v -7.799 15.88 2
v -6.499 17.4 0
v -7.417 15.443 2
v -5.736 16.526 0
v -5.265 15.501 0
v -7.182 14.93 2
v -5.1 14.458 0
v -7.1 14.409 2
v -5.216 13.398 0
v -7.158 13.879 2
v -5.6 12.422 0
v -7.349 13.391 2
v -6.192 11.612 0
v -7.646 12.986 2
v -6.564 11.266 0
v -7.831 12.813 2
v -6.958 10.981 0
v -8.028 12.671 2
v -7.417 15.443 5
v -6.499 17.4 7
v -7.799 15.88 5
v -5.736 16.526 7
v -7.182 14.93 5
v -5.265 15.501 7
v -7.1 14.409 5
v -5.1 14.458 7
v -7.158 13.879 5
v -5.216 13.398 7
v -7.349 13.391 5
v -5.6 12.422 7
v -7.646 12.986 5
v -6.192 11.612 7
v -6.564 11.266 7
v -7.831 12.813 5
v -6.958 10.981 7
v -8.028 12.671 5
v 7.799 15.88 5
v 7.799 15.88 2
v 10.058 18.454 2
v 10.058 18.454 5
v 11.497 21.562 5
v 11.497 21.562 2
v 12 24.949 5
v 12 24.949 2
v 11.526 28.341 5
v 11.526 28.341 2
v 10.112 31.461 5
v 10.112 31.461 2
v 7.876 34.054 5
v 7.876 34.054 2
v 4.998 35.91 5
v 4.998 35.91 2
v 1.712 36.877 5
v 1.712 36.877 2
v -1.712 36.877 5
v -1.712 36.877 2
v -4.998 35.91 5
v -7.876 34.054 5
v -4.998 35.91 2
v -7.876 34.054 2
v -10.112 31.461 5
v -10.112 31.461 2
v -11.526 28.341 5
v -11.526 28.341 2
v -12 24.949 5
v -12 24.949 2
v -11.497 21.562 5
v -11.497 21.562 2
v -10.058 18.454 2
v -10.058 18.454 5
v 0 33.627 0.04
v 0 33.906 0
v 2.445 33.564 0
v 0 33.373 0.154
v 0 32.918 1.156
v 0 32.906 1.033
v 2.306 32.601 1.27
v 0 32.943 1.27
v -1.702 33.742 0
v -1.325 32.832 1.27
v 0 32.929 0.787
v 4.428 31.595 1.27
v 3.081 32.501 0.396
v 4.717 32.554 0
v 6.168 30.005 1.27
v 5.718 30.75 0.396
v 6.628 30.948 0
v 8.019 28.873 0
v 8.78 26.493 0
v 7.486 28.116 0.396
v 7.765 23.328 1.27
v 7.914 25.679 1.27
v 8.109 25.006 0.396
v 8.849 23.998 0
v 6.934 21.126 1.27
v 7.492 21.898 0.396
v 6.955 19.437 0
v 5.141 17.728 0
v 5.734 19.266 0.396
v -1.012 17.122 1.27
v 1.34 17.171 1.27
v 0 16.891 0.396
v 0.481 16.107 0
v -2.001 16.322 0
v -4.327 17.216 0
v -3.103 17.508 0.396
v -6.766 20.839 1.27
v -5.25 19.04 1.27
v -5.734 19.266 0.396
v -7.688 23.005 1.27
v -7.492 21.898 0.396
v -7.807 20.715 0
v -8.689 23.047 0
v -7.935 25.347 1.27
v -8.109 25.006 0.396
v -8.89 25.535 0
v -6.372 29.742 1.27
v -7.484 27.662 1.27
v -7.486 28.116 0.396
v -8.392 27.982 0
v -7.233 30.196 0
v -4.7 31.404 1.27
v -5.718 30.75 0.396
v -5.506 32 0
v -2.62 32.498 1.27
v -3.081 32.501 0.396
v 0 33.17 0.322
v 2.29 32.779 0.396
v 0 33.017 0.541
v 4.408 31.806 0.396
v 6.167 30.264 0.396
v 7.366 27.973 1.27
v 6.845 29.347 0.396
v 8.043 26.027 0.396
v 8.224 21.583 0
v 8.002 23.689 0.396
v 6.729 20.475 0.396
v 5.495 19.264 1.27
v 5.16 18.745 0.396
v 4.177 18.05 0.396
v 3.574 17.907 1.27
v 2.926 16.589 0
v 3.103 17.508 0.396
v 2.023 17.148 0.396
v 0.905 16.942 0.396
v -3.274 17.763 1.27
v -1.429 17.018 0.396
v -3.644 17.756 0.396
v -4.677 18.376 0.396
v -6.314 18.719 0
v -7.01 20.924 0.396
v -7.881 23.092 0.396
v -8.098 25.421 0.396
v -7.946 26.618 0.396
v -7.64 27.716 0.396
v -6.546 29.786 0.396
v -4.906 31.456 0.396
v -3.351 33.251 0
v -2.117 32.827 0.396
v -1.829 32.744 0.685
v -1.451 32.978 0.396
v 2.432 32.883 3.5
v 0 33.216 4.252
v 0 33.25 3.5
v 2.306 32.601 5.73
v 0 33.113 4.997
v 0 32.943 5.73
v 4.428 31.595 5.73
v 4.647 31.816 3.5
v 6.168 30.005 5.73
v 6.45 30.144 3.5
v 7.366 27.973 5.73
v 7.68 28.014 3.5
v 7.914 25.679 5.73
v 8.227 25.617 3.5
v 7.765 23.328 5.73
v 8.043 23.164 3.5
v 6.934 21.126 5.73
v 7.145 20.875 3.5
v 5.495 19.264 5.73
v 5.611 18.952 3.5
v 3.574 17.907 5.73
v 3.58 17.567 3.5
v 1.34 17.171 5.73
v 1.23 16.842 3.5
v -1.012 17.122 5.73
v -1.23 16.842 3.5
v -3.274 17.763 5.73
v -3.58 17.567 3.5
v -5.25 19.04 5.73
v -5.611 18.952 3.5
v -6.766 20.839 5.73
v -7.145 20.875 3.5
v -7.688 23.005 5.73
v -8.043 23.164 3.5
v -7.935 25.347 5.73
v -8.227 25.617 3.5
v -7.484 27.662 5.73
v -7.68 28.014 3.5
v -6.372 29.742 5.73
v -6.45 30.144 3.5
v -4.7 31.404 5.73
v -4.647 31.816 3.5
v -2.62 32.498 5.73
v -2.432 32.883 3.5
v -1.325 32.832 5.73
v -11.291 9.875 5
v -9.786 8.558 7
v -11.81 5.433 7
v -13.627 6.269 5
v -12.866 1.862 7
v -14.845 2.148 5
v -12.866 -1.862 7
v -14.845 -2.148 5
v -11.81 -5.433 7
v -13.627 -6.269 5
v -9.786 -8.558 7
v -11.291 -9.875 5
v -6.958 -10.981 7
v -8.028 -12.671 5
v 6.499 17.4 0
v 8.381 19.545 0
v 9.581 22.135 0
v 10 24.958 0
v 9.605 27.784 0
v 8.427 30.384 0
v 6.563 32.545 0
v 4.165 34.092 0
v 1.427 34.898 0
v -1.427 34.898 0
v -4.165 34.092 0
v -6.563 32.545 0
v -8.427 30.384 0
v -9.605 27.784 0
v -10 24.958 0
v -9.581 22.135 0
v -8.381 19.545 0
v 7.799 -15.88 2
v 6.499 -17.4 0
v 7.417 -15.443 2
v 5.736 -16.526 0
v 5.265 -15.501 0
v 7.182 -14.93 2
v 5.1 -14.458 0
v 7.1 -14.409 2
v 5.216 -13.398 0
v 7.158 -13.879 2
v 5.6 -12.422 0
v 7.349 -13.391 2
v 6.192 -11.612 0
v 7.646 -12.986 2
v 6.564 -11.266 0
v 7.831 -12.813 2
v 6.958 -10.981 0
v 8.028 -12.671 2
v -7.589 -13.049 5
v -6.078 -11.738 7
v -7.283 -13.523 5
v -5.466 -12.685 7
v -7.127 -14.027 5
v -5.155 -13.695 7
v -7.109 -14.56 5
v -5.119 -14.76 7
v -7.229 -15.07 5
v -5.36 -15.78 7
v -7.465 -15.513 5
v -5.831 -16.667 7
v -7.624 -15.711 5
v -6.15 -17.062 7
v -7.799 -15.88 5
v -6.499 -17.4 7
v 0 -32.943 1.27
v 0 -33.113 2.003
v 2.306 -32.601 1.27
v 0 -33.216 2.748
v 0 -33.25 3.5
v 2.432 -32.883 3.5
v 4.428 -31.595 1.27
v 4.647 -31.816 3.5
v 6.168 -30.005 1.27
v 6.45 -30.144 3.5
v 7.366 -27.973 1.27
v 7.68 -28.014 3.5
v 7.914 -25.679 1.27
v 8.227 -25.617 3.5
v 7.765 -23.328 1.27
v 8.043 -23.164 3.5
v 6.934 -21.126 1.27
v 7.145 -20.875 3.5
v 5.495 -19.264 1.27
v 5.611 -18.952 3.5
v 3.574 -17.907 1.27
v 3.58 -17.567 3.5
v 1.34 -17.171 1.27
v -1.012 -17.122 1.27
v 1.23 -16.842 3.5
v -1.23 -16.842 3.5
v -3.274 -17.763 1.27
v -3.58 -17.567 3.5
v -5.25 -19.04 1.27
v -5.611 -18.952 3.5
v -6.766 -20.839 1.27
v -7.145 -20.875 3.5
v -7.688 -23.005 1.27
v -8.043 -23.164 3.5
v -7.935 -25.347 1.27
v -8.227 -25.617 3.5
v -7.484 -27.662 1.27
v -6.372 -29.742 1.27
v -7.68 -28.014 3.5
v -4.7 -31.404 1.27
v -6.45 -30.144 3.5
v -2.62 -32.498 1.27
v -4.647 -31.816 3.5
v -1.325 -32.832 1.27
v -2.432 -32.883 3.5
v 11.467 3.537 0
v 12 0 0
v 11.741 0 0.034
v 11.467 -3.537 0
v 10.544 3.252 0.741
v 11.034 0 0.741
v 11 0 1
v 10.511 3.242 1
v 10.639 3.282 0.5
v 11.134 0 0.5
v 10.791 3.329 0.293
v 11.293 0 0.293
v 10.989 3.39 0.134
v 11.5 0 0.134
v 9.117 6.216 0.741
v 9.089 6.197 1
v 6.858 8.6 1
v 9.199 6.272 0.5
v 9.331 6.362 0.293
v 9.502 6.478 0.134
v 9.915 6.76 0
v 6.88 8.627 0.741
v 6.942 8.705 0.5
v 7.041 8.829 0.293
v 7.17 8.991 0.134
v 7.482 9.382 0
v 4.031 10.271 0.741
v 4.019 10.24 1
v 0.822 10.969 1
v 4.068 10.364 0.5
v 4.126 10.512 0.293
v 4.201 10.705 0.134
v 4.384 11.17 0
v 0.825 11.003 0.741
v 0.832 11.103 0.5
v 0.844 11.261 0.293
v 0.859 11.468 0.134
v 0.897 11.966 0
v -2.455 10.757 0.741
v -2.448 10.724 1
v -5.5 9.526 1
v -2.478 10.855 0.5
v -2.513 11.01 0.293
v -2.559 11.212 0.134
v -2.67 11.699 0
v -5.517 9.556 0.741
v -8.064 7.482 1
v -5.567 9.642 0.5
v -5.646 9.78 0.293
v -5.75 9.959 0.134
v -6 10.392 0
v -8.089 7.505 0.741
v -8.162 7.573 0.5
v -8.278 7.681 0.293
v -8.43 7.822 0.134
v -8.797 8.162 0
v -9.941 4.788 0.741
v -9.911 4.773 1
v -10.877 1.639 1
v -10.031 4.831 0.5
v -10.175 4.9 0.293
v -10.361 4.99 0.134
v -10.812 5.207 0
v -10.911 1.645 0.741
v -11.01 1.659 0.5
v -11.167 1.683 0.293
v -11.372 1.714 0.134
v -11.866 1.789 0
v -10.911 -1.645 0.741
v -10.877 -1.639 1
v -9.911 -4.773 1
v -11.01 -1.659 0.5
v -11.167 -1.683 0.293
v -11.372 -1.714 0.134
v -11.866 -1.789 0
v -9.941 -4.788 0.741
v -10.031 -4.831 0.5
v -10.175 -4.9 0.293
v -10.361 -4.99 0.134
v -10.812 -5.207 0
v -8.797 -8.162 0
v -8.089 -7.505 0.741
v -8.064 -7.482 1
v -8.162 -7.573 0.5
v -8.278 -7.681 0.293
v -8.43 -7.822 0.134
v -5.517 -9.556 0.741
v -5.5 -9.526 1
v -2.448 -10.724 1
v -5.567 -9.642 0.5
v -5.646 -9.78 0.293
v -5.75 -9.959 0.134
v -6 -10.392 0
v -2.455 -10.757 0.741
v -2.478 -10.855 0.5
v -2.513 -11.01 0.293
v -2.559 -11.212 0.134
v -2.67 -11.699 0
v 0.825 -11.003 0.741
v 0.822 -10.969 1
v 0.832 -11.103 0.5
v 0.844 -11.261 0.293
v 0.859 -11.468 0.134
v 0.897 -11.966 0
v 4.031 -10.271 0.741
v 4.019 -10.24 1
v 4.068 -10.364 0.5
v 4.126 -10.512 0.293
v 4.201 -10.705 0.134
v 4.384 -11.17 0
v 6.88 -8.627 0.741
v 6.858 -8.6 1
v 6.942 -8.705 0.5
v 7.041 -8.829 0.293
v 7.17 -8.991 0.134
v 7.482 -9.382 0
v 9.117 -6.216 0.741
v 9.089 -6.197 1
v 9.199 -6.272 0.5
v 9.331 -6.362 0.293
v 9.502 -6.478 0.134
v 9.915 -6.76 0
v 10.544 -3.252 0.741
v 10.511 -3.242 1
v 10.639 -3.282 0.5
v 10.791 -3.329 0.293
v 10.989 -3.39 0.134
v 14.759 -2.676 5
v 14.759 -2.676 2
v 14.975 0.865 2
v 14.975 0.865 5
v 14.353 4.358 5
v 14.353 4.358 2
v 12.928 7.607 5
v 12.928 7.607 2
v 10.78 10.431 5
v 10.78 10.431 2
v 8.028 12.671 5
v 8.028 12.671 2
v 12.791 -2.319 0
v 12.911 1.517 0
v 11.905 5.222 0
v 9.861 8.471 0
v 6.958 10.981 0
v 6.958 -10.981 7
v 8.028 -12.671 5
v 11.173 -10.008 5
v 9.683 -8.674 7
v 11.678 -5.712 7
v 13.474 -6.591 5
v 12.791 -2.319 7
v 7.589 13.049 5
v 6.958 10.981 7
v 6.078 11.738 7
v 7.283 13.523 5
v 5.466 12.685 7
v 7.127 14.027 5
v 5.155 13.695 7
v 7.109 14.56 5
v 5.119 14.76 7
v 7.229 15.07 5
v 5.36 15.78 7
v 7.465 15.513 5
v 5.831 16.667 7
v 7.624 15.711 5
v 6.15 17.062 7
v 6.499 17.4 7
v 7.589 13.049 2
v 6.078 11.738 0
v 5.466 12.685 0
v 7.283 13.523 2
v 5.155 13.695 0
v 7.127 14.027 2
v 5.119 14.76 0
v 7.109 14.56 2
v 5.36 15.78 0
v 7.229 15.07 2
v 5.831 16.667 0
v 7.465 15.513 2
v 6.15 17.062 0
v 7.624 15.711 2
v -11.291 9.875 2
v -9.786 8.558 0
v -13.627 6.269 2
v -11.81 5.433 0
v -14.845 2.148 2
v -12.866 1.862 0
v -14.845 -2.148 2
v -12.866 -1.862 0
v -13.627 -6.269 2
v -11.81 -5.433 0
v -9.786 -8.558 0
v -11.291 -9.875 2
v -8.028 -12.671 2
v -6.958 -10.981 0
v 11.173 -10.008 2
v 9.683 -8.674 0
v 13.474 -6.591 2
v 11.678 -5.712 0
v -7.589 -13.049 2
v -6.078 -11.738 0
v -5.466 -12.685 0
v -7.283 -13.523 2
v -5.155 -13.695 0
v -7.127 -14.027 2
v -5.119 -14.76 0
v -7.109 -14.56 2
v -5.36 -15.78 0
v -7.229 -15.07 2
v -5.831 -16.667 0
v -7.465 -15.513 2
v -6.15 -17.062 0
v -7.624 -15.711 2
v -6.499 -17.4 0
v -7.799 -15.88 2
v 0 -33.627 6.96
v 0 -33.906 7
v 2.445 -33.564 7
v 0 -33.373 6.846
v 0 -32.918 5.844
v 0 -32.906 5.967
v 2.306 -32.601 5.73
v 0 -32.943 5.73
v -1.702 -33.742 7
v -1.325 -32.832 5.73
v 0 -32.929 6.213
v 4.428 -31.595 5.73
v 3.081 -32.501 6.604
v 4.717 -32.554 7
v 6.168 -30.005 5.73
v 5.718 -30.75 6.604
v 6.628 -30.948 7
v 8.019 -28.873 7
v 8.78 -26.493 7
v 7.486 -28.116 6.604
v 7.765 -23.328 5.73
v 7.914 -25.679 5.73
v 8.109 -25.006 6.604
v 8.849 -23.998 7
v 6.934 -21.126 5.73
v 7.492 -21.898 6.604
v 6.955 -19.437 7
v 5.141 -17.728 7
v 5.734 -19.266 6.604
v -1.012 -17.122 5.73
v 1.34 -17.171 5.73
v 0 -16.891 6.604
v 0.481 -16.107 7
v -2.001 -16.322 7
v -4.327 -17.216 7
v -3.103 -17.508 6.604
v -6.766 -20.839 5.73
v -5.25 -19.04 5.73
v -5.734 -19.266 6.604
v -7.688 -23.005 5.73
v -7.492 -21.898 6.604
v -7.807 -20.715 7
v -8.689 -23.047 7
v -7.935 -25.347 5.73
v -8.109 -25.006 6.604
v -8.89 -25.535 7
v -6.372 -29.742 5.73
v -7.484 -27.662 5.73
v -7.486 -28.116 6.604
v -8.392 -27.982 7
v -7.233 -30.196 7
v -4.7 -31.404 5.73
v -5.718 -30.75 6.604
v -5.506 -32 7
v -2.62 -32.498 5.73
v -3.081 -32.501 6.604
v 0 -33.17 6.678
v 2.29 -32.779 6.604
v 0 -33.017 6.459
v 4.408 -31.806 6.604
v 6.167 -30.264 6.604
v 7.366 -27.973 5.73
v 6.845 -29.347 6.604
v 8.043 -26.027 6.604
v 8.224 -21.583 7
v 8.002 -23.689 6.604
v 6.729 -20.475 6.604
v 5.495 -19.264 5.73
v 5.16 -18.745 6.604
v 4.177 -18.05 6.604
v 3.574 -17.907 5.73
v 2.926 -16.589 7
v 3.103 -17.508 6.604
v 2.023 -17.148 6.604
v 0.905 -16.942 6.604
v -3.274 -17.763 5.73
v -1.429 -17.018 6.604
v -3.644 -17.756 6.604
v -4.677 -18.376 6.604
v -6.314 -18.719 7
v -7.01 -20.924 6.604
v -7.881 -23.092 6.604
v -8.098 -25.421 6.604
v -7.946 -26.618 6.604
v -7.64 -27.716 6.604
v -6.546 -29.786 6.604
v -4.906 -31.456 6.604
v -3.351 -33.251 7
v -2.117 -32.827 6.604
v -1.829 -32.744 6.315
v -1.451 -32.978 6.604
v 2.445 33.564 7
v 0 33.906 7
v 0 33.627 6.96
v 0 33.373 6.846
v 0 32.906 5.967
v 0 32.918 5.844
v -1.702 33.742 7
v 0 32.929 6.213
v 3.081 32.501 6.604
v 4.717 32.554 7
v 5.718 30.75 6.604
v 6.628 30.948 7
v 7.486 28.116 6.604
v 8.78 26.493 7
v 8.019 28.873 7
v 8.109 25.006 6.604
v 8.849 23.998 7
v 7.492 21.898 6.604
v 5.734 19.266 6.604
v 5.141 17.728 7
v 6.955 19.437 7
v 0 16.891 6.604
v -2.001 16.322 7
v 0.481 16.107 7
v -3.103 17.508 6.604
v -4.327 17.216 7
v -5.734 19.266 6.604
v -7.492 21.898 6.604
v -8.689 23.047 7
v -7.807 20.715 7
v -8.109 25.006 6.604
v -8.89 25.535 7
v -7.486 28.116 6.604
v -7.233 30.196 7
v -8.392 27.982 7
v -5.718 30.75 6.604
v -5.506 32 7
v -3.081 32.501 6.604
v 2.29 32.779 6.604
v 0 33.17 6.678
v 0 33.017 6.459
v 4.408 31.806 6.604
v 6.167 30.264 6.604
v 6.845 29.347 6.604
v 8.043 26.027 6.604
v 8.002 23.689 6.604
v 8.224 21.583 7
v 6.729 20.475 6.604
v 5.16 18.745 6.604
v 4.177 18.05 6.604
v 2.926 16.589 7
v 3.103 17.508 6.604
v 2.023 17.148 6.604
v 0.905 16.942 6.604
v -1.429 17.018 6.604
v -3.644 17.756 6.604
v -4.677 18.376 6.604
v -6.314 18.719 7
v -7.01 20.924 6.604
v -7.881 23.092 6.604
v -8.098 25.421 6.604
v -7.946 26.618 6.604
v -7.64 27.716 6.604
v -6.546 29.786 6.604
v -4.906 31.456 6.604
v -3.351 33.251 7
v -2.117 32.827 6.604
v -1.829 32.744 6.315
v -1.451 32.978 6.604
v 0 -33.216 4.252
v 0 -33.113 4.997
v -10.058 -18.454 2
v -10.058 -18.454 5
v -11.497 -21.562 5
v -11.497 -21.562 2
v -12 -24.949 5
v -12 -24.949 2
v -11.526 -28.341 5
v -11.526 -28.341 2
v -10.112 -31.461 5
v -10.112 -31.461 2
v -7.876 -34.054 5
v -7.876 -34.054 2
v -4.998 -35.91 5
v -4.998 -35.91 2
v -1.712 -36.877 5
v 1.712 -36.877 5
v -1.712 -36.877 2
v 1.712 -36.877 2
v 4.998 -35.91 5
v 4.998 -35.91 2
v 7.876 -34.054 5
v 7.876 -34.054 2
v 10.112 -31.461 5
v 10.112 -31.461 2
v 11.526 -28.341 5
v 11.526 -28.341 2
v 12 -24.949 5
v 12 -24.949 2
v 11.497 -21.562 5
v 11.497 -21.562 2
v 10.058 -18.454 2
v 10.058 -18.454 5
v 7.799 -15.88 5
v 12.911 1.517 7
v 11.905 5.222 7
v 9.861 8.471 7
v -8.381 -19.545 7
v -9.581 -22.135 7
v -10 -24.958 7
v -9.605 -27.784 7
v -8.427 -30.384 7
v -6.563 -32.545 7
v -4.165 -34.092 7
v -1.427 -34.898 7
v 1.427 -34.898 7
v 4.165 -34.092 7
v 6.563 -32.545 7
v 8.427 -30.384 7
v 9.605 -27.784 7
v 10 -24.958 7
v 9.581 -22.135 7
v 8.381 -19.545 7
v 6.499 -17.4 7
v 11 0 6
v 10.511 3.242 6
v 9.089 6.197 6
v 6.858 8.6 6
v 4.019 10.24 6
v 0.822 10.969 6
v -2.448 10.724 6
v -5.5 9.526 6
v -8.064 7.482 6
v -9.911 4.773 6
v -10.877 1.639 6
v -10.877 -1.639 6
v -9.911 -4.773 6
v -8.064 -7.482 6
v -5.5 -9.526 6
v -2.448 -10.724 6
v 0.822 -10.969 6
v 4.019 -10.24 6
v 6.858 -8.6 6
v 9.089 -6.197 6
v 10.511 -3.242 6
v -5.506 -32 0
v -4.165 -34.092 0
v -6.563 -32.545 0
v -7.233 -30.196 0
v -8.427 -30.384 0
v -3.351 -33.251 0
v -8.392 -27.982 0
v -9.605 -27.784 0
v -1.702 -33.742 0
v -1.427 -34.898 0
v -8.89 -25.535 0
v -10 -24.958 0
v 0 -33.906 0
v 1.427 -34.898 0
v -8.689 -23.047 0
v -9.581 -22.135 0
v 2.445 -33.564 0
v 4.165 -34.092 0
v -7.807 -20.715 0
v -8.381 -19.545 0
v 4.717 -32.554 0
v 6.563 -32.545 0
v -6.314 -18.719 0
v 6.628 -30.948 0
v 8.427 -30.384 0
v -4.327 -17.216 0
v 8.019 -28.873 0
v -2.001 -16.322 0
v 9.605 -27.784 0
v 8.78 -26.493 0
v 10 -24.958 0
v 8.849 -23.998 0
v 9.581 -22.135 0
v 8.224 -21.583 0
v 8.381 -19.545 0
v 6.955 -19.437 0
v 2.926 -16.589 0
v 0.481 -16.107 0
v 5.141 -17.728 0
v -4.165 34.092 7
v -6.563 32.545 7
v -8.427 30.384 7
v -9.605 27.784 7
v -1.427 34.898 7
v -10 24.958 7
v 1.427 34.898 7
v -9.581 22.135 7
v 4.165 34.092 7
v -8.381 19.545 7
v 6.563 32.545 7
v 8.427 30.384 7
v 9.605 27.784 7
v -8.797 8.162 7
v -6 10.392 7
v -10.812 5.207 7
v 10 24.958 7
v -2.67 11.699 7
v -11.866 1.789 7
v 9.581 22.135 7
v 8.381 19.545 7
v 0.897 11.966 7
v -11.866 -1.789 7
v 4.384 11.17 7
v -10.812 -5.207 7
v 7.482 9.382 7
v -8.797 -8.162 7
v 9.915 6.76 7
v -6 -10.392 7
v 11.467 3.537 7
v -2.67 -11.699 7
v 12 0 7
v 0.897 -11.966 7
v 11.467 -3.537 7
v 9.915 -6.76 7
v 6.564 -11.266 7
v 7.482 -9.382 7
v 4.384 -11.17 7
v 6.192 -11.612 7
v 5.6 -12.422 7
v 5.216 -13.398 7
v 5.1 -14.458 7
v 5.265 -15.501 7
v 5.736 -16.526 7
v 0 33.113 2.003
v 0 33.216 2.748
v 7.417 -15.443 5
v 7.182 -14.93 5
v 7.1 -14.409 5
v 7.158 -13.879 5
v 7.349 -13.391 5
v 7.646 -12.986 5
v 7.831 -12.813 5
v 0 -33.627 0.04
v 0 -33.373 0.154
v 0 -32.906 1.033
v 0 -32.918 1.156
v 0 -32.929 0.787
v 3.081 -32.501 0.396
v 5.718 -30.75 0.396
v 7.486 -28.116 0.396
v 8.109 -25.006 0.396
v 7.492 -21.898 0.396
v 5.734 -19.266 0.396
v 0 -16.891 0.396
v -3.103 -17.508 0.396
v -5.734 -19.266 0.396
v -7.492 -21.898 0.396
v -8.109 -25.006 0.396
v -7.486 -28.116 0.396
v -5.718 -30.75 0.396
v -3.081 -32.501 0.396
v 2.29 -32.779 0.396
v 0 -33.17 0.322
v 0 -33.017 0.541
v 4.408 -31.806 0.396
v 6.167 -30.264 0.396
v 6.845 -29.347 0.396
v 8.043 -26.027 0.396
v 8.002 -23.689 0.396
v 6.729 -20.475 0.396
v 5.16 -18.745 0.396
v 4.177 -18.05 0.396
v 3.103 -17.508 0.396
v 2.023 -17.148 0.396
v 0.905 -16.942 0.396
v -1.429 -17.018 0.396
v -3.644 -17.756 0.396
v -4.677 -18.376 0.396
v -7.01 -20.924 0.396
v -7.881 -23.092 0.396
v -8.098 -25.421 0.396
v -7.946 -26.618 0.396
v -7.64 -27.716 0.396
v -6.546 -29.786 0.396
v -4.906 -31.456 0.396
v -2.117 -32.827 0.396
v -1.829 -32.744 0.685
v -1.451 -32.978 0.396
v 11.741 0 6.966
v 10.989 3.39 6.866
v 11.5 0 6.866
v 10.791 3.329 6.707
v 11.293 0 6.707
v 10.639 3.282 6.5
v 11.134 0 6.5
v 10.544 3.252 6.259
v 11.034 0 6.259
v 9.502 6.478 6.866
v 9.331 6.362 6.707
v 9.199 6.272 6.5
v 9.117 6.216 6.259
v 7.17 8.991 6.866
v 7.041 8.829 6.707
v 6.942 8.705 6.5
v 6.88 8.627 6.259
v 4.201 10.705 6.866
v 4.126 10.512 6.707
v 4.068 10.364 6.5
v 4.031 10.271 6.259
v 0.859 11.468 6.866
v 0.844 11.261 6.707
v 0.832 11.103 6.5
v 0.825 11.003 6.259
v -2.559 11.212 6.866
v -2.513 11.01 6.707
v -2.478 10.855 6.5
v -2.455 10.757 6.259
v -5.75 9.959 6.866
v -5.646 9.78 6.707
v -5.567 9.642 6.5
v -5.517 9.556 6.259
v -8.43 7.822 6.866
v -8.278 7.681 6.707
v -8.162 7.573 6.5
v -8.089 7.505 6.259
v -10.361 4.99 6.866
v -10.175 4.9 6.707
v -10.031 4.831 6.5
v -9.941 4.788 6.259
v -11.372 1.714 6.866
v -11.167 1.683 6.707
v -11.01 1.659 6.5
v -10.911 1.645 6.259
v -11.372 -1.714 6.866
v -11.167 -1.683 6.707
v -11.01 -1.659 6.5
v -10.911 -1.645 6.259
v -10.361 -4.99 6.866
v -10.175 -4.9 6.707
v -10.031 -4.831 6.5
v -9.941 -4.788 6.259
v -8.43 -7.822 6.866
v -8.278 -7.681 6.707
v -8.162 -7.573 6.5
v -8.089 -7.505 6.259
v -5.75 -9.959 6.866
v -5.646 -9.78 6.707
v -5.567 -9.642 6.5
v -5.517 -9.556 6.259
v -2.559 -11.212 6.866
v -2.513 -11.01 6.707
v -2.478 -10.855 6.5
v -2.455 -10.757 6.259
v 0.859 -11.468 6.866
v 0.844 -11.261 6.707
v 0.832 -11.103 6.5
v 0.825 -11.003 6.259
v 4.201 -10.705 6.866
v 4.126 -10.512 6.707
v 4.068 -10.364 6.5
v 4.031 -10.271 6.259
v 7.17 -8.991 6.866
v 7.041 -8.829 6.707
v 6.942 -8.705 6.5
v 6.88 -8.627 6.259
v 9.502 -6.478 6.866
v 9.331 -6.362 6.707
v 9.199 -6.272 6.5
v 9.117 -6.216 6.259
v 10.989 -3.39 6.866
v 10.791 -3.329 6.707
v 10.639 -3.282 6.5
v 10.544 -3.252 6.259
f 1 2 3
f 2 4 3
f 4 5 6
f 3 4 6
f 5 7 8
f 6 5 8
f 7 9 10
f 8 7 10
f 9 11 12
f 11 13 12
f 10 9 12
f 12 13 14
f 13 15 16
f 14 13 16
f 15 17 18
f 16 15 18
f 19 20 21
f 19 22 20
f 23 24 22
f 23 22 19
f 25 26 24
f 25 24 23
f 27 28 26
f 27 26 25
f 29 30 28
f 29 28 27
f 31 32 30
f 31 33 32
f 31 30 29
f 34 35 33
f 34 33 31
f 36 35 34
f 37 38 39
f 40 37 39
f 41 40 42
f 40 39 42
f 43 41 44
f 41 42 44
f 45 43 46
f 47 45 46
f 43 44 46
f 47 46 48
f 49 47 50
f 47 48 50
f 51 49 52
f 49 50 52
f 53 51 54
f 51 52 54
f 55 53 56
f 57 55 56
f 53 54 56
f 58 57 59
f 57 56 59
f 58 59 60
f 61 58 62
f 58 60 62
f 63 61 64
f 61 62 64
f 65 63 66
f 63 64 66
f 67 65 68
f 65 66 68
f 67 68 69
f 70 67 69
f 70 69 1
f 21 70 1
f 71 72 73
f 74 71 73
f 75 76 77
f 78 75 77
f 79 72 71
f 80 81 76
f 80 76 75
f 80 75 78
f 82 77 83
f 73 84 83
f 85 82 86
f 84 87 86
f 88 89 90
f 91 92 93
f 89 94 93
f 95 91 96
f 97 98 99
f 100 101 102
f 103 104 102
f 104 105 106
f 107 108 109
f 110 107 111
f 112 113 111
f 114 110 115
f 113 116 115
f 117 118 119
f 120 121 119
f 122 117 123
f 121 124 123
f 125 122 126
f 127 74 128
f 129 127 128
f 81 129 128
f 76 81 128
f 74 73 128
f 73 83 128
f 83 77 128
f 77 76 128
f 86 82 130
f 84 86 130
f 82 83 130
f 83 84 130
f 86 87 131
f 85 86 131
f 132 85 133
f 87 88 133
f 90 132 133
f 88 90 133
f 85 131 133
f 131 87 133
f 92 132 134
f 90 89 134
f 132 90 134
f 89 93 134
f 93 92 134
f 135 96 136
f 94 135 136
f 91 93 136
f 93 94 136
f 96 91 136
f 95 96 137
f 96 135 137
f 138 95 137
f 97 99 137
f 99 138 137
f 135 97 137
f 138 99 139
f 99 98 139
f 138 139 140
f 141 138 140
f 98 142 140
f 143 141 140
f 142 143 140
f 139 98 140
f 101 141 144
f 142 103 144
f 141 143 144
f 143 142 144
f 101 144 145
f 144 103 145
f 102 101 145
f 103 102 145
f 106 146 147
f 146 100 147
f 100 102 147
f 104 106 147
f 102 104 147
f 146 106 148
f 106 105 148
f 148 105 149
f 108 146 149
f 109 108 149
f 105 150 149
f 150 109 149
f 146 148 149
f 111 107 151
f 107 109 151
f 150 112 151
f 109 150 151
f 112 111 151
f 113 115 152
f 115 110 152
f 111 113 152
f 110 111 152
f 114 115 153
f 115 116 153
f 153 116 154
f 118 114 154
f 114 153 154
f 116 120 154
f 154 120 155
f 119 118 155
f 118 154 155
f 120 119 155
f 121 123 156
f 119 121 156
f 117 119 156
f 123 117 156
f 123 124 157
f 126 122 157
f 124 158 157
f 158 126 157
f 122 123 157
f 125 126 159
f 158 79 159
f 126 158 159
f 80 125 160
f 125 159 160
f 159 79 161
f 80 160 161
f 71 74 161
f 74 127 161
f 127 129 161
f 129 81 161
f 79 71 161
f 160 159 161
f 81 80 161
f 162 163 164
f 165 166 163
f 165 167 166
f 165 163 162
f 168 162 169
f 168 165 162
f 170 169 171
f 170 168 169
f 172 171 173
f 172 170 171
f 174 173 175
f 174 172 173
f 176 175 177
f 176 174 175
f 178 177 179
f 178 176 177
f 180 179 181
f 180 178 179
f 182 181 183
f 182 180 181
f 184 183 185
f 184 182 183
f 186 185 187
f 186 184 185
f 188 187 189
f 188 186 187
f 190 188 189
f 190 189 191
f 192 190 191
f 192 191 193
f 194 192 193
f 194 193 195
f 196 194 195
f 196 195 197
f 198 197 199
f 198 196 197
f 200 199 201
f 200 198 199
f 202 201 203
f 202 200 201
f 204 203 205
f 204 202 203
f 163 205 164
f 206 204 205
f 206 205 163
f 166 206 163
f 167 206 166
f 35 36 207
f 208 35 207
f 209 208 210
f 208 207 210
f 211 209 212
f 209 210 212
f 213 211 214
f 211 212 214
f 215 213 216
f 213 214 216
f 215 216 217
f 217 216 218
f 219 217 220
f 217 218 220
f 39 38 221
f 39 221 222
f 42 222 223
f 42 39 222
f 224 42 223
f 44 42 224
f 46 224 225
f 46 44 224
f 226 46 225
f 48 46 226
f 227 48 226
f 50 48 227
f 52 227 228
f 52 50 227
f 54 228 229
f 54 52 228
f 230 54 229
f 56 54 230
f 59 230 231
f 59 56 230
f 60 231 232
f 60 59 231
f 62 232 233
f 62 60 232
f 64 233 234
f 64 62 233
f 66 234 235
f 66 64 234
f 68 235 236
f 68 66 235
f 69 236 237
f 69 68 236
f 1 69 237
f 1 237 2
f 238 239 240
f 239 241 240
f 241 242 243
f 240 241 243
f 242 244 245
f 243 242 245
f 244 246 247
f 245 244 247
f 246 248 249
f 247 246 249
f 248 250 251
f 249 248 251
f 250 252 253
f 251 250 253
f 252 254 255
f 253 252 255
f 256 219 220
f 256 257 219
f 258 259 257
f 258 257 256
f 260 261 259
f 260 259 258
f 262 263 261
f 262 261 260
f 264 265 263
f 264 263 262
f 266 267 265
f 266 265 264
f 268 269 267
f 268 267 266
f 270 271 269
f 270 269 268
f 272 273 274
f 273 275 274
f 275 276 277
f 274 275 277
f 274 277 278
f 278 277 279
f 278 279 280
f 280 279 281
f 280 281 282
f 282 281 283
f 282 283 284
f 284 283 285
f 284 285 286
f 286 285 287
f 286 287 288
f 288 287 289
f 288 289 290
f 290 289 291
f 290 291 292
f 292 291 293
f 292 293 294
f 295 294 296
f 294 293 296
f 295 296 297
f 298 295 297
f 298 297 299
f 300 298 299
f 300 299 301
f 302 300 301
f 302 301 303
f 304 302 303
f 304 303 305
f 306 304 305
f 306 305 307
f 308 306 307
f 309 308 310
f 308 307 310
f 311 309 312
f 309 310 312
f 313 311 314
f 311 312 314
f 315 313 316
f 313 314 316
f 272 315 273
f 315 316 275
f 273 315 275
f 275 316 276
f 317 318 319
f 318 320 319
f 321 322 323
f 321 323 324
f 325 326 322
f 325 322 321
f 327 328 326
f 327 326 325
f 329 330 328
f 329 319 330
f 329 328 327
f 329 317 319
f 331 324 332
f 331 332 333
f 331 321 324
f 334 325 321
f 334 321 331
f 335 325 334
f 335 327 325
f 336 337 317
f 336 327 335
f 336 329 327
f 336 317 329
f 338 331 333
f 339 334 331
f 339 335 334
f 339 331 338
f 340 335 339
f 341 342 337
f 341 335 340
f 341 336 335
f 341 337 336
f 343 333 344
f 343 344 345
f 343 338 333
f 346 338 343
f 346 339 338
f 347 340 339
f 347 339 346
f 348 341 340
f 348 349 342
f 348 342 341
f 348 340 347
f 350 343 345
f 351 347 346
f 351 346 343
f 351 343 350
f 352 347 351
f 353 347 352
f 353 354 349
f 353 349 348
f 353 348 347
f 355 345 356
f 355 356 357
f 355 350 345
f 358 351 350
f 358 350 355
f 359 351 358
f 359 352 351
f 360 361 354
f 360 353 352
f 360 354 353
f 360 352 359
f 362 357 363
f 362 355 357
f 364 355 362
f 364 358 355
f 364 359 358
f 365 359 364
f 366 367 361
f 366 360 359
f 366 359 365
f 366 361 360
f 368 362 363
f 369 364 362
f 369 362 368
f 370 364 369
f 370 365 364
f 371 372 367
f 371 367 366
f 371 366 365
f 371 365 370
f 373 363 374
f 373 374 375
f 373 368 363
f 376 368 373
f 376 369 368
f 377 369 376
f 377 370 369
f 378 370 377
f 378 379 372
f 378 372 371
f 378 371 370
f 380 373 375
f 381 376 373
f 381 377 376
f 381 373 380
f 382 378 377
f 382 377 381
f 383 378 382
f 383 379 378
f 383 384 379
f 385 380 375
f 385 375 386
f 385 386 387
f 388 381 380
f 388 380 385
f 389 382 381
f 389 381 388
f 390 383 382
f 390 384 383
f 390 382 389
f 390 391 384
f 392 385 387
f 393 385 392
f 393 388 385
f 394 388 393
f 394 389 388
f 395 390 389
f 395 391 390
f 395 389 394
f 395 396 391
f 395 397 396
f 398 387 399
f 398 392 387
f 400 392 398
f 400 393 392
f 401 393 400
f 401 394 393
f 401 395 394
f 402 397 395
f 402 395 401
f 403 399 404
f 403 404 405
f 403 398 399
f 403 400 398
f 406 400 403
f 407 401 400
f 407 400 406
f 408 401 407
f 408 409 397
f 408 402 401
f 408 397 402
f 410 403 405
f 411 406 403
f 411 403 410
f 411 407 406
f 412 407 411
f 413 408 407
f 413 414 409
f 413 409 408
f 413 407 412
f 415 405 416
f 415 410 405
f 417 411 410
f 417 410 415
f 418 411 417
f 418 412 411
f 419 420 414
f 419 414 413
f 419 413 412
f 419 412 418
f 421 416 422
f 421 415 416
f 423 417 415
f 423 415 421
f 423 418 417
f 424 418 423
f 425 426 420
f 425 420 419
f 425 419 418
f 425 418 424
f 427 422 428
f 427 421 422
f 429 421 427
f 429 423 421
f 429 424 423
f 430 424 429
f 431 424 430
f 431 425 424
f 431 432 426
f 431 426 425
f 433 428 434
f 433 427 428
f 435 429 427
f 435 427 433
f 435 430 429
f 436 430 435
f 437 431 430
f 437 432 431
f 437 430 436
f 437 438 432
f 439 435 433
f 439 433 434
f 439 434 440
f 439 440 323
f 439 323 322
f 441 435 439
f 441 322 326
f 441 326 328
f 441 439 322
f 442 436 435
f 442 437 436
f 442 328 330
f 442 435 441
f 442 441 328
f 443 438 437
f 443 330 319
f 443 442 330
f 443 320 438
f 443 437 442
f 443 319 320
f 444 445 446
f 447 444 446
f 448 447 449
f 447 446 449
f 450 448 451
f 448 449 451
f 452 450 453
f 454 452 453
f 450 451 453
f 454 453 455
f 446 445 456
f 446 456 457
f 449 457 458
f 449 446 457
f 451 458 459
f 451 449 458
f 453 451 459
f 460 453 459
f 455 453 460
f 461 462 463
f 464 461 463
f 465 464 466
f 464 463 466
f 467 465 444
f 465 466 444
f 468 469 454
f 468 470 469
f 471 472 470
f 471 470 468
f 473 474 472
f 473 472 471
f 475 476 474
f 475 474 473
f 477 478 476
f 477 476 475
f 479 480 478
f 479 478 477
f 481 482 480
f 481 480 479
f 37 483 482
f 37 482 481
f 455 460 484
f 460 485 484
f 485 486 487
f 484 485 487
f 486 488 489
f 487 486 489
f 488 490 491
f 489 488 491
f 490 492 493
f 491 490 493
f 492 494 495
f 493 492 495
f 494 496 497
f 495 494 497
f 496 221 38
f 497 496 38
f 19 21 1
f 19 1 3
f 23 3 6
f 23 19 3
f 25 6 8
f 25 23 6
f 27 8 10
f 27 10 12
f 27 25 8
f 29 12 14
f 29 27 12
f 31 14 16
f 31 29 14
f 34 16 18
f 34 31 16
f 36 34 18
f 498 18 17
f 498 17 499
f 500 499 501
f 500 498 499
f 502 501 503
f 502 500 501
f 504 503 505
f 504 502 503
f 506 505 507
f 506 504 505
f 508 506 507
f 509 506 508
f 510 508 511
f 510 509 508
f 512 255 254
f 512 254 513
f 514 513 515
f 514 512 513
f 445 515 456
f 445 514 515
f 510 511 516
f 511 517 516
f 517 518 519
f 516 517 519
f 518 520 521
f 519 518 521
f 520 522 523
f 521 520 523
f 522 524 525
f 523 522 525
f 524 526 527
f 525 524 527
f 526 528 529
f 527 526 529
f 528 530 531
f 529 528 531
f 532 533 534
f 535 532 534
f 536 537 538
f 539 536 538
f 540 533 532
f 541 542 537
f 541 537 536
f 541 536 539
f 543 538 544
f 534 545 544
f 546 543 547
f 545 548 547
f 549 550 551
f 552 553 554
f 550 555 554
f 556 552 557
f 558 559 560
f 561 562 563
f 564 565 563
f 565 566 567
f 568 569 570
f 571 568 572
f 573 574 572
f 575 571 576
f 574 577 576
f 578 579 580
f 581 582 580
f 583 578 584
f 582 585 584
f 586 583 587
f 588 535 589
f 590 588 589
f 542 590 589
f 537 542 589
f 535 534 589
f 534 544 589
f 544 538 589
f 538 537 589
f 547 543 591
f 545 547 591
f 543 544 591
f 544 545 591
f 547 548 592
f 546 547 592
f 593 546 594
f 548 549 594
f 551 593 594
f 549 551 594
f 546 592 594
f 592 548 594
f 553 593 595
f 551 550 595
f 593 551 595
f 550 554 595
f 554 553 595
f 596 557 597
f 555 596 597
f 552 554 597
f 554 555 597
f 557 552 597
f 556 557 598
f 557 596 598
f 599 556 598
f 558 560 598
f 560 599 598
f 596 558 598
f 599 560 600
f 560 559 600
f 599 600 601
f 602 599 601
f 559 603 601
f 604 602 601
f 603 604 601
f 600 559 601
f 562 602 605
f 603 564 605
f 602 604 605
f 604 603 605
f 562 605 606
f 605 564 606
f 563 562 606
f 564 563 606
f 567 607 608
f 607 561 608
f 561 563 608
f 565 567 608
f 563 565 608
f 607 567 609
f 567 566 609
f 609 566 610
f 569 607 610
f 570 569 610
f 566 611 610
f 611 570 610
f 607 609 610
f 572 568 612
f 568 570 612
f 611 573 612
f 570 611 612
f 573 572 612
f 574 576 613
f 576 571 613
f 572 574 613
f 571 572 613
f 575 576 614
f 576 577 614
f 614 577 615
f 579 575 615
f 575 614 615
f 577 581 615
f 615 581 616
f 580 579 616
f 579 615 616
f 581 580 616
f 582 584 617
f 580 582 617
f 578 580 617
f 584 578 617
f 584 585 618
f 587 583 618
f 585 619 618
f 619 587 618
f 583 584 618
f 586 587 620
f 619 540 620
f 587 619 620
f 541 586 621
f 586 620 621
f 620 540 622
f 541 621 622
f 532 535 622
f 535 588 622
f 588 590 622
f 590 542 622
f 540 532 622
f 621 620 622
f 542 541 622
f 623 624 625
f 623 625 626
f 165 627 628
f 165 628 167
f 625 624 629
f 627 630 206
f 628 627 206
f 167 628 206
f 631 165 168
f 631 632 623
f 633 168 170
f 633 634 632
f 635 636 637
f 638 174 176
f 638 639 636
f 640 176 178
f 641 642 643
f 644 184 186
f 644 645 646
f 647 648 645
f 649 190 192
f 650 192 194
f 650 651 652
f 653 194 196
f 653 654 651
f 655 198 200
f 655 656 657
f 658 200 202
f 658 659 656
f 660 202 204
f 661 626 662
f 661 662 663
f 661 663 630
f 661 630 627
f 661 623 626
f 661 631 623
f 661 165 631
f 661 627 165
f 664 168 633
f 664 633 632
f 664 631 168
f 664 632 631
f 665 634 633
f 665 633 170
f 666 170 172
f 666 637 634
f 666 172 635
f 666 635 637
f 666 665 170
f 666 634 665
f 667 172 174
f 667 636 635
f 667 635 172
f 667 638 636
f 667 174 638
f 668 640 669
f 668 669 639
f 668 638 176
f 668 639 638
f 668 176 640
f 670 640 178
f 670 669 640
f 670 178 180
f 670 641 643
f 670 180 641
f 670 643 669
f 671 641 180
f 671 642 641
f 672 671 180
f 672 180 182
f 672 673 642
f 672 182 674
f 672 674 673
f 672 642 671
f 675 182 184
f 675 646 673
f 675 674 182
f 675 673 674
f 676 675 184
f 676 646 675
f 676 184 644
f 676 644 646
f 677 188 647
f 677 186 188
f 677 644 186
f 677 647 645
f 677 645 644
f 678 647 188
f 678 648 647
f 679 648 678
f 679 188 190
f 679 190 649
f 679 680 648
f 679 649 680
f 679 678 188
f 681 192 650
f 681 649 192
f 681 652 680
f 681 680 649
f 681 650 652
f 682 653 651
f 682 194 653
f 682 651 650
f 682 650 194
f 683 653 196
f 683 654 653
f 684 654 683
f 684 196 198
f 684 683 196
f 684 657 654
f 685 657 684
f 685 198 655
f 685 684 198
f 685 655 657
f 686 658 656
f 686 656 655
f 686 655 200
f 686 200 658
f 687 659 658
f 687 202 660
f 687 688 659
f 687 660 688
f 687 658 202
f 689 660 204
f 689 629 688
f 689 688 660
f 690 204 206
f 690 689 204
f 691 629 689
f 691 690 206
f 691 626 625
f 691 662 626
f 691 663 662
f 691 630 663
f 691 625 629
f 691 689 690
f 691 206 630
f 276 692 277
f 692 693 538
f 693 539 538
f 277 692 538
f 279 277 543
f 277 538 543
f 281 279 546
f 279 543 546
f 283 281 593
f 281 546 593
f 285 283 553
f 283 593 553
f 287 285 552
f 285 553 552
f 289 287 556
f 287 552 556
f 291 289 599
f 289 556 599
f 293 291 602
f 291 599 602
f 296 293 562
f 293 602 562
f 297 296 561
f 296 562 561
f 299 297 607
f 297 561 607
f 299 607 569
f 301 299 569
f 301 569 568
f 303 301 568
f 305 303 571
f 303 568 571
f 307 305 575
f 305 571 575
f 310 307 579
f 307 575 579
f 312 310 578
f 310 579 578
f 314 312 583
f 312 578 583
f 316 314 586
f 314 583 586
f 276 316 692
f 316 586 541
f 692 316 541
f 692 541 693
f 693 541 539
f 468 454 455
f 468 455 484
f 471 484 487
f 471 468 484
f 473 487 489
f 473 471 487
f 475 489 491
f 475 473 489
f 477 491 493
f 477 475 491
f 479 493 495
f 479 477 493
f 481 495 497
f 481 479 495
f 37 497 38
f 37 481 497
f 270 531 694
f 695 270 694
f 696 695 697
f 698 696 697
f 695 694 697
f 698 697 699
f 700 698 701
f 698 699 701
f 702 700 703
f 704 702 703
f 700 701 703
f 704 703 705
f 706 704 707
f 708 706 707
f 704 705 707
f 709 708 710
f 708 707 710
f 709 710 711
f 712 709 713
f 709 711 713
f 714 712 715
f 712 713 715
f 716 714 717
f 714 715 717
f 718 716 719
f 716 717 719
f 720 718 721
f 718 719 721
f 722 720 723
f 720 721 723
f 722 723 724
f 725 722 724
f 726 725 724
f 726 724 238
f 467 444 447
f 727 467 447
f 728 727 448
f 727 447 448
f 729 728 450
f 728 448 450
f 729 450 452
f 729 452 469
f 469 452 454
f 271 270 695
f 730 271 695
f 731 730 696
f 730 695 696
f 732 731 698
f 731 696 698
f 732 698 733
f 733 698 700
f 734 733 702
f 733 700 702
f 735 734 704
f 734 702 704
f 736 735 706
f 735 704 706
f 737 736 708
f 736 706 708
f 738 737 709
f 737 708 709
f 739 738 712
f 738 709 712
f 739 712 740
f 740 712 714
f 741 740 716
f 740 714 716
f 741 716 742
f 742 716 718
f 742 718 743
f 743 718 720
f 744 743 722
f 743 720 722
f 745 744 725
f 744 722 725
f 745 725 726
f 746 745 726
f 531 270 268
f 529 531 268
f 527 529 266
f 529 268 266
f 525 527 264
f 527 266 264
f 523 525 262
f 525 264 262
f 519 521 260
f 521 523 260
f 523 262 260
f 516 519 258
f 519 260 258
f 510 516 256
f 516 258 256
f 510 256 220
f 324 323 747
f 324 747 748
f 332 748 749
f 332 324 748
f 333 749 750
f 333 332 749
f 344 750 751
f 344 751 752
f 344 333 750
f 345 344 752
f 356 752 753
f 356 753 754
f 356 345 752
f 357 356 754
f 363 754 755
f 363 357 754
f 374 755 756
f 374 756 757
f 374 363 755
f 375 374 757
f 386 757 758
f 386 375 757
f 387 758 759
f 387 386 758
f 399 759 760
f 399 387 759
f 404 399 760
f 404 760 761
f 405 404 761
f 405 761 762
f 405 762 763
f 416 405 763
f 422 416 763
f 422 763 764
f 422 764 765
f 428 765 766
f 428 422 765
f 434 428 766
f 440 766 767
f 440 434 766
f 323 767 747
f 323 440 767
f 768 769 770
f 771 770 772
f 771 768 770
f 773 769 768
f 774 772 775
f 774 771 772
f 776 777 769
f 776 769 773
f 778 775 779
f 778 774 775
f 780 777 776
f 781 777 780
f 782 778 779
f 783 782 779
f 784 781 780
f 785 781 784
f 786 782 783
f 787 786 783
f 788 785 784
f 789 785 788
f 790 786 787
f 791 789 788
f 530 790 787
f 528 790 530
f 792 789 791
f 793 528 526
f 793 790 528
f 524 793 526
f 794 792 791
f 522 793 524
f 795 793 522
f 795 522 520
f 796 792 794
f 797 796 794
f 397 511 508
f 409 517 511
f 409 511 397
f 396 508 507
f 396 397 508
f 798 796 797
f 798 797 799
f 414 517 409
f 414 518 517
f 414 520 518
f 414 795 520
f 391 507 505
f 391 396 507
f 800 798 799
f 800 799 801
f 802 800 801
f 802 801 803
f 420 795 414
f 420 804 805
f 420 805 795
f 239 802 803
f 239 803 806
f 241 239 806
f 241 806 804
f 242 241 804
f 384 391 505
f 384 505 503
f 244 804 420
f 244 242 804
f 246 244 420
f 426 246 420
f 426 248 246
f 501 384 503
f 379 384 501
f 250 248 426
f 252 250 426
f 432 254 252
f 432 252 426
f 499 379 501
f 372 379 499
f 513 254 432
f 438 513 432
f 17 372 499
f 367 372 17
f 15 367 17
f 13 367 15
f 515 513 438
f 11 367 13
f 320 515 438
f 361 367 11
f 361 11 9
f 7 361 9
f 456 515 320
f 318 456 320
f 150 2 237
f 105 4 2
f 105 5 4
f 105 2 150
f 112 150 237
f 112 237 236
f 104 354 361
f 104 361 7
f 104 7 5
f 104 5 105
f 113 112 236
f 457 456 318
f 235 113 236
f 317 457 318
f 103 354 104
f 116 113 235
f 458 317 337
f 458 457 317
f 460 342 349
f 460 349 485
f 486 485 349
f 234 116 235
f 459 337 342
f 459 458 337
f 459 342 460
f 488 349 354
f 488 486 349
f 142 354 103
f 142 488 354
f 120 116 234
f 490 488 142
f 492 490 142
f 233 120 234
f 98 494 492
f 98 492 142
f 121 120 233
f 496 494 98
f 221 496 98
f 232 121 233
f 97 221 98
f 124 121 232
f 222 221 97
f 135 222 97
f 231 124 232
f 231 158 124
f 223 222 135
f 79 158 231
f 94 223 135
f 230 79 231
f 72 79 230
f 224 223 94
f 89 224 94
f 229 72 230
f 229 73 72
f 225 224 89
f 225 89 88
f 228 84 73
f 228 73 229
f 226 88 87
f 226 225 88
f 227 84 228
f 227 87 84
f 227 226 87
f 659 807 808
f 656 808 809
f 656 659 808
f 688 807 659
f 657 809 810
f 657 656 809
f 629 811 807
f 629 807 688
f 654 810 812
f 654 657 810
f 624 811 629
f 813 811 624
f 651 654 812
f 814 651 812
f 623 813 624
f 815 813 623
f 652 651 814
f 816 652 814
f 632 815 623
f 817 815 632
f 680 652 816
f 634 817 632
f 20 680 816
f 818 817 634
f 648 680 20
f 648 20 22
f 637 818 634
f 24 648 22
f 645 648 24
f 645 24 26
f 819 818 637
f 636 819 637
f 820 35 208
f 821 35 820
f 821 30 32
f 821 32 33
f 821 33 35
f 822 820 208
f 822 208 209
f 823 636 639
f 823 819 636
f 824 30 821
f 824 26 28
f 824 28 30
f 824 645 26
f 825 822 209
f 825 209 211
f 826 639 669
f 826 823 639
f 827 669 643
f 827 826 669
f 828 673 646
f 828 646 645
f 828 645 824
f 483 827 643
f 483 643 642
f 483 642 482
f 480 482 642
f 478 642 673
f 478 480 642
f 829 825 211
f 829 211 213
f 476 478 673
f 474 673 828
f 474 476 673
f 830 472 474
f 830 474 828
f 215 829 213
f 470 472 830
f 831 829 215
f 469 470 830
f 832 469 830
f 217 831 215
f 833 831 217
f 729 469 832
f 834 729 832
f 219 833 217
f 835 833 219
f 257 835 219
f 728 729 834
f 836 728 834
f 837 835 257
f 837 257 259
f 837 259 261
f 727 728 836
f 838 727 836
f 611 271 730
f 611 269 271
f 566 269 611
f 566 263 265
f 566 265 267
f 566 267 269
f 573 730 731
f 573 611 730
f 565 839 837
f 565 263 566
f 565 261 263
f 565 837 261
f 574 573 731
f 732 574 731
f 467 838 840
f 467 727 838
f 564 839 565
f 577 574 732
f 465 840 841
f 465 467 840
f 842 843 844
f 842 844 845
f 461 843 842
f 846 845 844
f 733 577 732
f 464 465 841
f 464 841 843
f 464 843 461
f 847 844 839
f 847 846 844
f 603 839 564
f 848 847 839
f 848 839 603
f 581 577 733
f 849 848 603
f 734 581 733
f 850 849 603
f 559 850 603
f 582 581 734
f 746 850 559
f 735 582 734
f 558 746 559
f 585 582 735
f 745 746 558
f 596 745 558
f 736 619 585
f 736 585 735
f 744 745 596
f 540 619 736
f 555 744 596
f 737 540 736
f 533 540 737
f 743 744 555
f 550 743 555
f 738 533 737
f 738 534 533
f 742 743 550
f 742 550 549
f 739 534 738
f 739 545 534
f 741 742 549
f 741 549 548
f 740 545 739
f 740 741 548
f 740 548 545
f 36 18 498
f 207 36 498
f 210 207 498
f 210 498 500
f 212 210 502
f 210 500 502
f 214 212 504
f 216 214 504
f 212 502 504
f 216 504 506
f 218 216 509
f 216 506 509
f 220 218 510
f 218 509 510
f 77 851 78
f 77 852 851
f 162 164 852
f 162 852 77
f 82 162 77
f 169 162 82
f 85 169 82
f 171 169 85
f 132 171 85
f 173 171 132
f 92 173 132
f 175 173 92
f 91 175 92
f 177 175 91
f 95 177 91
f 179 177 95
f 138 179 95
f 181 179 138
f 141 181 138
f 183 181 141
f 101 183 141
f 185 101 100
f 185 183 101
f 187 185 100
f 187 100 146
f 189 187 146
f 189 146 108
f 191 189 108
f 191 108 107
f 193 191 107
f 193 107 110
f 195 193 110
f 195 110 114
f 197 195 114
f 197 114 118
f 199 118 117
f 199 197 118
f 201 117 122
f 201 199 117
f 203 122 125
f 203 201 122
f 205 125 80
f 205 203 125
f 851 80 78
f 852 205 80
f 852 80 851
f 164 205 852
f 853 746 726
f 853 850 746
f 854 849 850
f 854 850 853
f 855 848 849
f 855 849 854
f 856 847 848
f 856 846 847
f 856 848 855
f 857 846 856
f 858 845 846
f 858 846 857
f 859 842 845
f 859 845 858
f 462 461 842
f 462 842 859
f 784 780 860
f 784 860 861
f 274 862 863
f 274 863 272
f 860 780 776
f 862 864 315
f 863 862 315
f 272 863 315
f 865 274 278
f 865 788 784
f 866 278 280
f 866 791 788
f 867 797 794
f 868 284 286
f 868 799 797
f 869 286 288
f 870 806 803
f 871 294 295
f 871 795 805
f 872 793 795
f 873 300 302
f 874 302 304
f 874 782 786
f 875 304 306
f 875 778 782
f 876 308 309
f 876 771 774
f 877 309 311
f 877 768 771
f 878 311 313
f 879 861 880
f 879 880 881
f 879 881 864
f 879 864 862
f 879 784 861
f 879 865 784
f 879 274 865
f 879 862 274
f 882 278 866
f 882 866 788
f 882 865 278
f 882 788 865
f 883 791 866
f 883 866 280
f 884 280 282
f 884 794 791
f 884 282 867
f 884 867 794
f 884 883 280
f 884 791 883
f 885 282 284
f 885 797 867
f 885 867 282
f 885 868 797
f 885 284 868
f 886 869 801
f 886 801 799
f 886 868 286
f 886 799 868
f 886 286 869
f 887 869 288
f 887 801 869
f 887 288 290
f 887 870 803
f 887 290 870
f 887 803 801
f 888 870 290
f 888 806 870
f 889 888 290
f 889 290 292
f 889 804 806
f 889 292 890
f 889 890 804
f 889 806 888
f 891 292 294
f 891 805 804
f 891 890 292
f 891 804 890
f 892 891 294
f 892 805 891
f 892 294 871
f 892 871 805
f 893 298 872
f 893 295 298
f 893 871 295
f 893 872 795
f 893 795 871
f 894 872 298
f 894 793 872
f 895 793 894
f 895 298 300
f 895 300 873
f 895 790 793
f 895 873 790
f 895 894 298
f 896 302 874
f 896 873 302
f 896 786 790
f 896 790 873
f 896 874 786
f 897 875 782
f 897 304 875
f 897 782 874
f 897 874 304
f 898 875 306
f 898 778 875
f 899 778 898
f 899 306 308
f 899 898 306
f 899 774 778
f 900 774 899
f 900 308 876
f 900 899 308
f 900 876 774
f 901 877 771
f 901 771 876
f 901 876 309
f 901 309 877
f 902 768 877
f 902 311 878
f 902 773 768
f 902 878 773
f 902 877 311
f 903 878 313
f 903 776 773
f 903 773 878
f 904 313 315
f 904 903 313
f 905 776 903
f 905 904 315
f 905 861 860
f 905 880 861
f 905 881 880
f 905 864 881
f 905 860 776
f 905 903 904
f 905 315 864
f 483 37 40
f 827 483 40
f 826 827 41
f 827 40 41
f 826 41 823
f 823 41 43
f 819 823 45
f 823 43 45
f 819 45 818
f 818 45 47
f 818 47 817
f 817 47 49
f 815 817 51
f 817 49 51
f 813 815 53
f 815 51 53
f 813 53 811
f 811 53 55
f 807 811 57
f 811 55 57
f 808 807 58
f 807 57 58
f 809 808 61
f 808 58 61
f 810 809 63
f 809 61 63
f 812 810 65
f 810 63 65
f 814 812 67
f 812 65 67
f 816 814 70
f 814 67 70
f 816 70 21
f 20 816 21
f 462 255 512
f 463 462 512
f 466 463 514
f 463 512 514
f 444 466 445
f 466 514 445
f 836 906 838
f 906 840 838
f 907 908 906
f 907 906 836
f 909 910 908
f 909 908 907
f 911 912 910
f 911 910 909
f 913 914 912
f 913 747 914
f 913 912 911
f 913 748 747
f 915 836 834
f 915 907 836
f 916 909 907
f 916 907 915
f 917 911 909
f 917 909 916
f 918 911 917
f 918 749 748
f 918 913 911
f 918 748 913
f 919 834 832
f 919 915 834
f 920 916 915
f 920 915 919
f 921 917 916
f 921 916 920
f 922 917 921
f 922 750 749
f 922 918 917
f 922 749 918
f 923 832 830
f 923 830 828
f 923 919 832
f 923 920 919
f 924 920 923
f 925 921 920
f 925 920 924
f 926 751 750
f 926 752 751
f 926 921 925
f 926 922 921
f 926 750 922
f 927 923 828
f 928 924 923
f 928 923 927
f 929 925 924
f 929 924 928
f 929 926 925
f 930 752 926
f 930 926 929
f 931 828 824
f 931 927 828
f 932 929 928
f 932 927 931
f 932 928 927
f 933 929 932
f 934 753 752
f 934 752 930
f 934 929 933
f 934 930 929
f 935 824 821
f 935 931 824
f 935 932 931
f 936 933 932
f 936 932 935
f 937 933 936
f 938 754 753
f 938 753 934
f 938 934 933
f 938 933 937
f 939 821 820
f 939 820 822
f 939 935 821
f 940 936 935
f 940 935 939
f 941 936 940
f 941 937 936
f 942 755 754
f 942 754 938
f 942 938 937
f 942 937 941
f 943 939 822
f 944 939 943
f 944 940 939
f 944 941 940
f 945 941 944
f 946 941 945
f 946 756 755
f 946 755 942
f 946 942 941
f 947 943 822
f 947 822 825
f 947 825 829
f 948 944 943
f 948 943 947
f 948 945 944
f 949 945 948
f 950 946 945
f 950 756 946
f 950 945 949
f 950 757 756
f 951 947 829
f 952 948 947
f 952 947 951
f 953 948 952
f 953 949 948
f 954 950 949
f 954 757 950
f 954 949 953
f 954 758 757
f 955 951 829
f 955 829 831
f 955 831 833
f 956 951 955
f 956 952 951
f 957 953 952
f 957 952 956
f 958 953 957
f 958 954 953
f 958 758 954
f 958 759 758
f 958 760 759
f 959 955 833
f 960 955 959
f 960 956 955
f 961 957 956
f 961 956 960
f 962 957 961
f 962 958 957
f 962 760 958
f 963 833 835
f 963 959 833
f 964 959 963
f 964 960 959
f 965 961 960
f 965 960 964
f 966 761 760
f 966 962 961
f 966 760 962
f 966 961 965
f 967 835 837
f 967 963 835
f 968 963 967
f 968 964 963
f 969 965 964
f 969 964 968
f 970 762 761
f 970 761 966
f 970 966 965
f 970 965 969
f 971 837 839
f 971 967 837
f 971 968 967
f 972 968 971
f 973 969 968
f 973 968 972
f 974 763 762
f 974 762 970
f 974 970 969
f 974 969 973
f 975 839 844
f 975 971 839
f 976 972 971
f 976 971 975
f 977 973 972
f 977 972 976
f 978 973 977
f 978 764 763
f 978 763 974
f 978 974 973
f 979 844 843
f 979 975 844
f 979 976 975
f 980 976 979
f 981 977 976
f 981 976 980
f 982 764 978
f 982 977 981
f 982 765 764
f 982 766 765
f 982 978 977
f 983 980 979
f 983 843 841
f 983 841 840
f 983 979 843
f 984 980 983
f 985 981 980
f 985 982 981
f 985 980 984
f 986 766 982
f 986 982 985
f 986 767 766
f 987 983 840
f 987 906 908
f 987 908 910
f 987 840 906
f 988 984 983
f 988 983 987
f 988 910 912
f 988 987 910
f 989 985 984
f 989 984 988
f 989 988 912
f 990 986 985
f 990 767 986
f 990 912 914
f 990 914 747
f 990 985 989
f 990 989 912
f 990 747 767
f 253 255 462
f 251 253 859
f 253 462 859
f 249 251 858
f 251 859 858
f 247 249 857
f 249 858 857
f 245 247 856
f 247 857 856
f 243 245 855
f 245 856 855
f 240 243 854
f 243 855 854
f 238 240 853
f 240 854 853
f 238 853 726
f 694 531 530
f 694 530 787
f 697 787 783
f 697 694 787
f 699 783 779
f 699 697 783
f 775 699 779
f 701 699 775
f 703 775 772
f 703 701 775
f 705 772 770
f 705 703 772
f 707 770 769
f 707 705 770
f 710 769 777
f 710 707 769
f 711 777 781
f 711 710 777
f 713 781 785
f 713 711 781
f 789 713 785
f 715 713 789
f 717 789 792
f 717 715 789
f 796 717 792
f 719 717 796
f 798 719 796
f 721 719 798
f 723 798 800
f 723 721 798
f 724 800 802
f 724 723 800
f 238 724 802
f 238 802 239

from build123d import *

# Parameters (mm, degrees)
F0_R     = 8.25
F0_R_2   = 11
F1_DEPTH = 7
F2_R     = 2
F3_SIZE  = 2
F9_R     = 1


# Not quite as in the source:
# - a pattern or mirror of a feature is missing from the dataset's text; its kind, count and spacing are read off the source's solid
# - a feature names something its author has since deleted; it is built from what else it names


with BuildPart() as f1:
    # F0 (on Top) → F1 (new body)
    with BuildSketch(Plane.XY):
        with BuildLine():
            ThreePointArc((14.7593654246, -2.6760291972), (12.9903810568, 7.5), (5.0621734463, 14.12))
            ThreePointArc((5.0621734463, 14.12), (0, 37), (-5.0621734463, 14.12))
            ThreePointArc((-5.0621734463, 14.12), (-15, 0), (-5.0621734463, -14.12))
            ThreePointArc((-5.0621734463, -14.12), (0, -37), (5.0621734463, -14.12))
            ThreePointArc((5.0621734463, -14.12), (11.4439708028, -9.6971919783), (14.7593654246, -2.6760291972))
        make_face()
        with Locations((0, -25)):
            Circle(F0_R, mode=Mode.SUBTRACT)
        Circle(F0_R_2, mode=Mode.SUBTRACT)
        with Locations((0, 25)):
            Circle(F0_R, mode=Mode.SUBTRACT)
    extrude(amount=F1_DEPTH)

    # F2
    f2_edges = [f1.edges().sort_by_distance(p)[0] for p in [
        (5.062173, -14.12, 3.5),
        (5.062173, 14.12, 3.5),
        (-5.062173, 14.12, 3.5),
        (-5.062173, -14.12, 3.5),
    ]]
    fillet(f2_edges, radius=F2_R)

    # F3
    f3_edges = [f1.edges().sort_by_distance(p)[0] for p in [
        (0, -37, 7),
        (0, -37, 0),
        (15, 0, 7),
        (15, 0, 0),
        (7.104012, 14.217419, 7),
        (7.104012, -14.217419, 7),
        (0, 37, 7),
        (-7.104012, 14.217419, 7),
        (-7.104012, -14.217419, 7),
        (-15, 0, 7),
        (7.104012, 14.217419, 0),
        (7.104012, -14.217419, 0),
        (0, 37, 0),
        (-7.104012, -14.217419, 0),
        (-7.104012, 14.217419, 0),
        (-15, 0, 0),
    ]]
    chamfer(f3_edges, length=F3_SIZE)

    # F7 (on 3pt) → F8 (revolve)
    with BuildSketch(Plane.YZ):
        with BuildLine():
            Line((-32.4707763987, 7), (-33.25, 7))
            Line((-33.25, 7), (-33.25, 3.5))
            ThreePointArc((-33.25, 3.5), (-33.0528381733, 5.2928461605), (-32.4707763987, 7))
        make_face()
        with BuildLine():
            ThreePointArc((-32.4707763987, 0), (-33.0528381733, 1.7071538395), (-33.25, 3.5))
            Line((-33.25, 3.5), (-33.25, 0))
            Line((-33.25, 0), (-32.4707763987, 0))
        make_face()
    f8 = revolve(axis=Axis((0, -25, 3.5), (0, 0, 1)))

    # F8_copies: F8 across plane
    add(f8.mirror(Plane.ZX))

    # F9
    f9_edges = [f1.edges().sort_by_distance(p)[0] for p in [
        (0, -17.529224, 7),
        (0, -17.529224, 0),
        (-11, 0, 0),
        (-11, 0, 7),
        (0, 17.529224, 7),
        (0, 17.529224, 0),
    ]]
    fillet(f9_edges, radius=F9_R)


solid = f1.part
